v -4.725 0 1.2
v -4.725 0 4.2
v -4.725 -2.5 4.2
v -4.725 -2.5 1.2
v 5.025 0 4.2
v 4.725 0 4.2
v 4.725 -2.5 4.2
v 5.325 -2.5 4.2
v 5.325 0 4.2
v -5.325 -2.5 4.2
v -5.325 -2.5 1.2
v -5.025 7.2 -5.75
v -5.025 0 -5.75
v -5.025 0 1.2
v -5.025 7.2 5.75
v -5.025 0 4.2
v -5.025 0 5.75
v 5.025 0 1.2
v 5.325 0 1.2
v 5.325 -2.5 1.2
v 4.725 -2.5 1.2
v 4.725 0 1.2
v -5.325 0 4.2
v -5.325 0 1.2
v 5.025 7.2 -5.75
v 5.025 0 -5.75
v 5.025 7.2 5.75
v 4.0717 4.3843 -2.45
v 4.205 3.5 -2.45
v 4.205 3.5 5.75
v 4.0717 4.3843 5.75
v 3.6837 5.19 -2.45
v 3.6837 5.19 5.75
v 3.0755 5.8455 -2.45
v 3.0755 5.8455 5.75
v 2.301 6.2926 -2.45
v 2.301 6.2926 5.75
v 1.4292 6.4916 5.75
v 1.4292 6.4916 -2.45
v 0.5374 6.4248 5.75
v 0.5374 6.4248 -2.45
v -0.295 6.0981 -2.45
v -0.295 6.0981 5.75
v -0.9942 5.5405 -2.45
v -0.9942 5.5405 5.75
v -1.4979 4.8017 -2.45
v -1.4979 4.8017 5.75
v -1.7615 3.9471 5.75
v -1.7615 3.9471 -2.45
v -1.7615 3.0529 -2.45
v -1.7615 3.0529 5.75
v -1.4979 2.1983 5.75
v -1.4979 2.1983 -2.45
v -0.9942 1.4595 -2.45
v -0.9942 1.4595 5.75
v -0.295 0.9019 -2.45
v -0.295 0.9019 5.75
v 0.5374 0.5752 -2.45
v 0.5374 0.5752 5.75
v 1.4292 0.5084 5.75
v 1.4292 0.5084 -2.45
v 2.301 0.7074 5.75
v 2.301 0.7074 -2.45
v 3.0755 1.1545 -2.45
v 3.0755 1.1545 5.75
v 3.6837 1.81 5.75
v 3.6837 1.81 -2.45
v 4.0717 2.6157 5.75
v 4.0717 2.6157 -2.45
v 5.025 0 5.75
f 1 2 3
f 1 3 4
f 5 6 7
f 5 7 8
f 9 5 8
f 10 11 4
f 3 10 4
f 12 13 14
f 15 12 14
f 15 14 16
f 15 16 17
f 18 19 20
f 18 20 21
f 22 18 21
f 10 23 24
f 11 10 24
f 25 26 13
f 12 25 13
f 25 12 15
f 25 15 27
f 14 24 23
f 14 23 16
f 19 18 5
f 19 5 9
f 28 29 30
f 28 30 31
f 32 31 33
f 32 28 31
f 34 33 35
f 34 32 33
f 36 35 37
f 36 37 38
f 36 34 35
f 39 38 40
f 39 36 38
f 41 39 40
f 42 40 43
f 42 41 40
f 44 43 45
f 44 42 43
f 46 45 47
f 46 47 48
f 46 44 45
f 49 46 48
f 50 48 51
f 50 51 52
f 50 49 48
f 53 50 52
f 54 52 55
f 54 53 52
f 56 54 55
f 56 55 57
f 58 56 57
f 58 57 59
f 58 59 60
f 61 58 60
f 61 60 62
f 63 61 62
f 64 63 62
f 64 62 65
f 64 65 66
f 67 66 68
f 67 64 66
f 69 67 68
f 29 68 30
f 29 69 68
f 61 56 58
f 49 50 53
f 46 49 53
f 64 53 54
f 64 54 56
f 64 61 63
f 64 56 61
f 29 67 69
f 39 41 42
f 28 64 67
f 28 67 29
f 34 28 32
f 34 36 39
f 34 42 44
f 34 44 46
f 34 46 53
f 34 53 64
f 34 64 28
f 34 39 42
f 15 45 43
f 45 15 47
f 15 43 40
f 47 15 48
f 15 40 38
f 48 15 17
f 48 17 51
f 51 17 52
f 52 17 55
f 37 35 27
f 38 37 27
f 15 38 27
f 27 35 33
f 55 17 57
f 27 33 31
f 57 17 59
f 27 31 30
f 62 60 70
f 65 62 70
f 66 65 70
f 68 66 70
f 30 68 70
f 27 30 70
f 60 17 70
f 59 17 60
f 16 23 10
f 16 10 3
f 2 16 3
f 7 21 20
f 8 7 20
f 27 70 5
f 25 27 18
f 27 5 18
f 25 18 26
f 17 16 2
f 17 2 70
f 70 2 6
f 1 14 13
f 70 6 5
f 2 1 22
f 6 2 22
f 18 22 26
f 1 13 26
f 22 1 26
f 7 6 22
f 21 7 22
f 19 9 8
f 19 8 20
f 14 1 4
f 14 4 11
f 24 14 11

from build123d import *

# Parameters (mm, degrees)
SKETCH1_W             = 0.6
SKETCH1_H             = 3
BOSS_EXTRUDE1_DEPTH   = 2.5
BOSS_EXTRUDE1_2_DEPTH = 2.5
SKETCH1_3_W           = 10.05
SKETCH1_3_H           = 11.5
BOSS_EXTRUDE2_DEPTH   = 7.2
F_3DSKETCH2_R         = 3
CUT_EXTRUDE1_DEPTH    = 8.2


with BuildPart() as part:
    # Sketch1 → Boss-Extrude1 (new body)
    with BuildSketch(Plane(origin=(0, 0, 0), x_dir=(1, 0, 0), z_dir=(0, 1, 0))):
        with Locations((-5.025, -2.7)):
            Rectangle(SKETCH1_W, SKETCH1_H)
    extrude(amount=-BOSS_EXTRUDE1_DEPTH)



with BuildPart() as body_2:
    # Sketch1 → Boss-Extrude1 2 (new body)
    with BuildSketch(Plane(origin=(0, 0, 0), x_dir=(1, 0, 0), z_dir=(0, 1, 0))):
        with Locations((5.025, -2.7)):
            Rectangle(SKETCH1_W, SKETCH1_H)
    extrude(amount=-BOSS_EXTRUDE1_2_DEPTH)


with BuildPart() as part_1:
    add(part.part)

    add(body_2.part)  # Boss-Extrude2 merges body 2
    # Sketch1<3> → Boss-Extrude2 (add)
    with BuildSketch(Plane(origin=(0, 0, 0), x_dir=(1, 0, 0), z_dir=(0, 1, 0))):
        Rectangle(SKETCH1_3_W, SKETCH1_3_H)
    extrude(amount=BOSS_EXTRUDE2_DEPTH)

    # 3DSketch2 → Cut-Extrude1 (cut)
    with BuildSketch(Plane(origin=(1.205, 3.5, 5.75), x_dir=(-1, 0, 0), z_dir=(0, 0, -1))):
        Circle(F_3DSKETCH2_R)
    extrude(amount=CUT_EXTRUDE1_DEPTH, mode=Mode.SUBTRACT)


solid = part_1.part
